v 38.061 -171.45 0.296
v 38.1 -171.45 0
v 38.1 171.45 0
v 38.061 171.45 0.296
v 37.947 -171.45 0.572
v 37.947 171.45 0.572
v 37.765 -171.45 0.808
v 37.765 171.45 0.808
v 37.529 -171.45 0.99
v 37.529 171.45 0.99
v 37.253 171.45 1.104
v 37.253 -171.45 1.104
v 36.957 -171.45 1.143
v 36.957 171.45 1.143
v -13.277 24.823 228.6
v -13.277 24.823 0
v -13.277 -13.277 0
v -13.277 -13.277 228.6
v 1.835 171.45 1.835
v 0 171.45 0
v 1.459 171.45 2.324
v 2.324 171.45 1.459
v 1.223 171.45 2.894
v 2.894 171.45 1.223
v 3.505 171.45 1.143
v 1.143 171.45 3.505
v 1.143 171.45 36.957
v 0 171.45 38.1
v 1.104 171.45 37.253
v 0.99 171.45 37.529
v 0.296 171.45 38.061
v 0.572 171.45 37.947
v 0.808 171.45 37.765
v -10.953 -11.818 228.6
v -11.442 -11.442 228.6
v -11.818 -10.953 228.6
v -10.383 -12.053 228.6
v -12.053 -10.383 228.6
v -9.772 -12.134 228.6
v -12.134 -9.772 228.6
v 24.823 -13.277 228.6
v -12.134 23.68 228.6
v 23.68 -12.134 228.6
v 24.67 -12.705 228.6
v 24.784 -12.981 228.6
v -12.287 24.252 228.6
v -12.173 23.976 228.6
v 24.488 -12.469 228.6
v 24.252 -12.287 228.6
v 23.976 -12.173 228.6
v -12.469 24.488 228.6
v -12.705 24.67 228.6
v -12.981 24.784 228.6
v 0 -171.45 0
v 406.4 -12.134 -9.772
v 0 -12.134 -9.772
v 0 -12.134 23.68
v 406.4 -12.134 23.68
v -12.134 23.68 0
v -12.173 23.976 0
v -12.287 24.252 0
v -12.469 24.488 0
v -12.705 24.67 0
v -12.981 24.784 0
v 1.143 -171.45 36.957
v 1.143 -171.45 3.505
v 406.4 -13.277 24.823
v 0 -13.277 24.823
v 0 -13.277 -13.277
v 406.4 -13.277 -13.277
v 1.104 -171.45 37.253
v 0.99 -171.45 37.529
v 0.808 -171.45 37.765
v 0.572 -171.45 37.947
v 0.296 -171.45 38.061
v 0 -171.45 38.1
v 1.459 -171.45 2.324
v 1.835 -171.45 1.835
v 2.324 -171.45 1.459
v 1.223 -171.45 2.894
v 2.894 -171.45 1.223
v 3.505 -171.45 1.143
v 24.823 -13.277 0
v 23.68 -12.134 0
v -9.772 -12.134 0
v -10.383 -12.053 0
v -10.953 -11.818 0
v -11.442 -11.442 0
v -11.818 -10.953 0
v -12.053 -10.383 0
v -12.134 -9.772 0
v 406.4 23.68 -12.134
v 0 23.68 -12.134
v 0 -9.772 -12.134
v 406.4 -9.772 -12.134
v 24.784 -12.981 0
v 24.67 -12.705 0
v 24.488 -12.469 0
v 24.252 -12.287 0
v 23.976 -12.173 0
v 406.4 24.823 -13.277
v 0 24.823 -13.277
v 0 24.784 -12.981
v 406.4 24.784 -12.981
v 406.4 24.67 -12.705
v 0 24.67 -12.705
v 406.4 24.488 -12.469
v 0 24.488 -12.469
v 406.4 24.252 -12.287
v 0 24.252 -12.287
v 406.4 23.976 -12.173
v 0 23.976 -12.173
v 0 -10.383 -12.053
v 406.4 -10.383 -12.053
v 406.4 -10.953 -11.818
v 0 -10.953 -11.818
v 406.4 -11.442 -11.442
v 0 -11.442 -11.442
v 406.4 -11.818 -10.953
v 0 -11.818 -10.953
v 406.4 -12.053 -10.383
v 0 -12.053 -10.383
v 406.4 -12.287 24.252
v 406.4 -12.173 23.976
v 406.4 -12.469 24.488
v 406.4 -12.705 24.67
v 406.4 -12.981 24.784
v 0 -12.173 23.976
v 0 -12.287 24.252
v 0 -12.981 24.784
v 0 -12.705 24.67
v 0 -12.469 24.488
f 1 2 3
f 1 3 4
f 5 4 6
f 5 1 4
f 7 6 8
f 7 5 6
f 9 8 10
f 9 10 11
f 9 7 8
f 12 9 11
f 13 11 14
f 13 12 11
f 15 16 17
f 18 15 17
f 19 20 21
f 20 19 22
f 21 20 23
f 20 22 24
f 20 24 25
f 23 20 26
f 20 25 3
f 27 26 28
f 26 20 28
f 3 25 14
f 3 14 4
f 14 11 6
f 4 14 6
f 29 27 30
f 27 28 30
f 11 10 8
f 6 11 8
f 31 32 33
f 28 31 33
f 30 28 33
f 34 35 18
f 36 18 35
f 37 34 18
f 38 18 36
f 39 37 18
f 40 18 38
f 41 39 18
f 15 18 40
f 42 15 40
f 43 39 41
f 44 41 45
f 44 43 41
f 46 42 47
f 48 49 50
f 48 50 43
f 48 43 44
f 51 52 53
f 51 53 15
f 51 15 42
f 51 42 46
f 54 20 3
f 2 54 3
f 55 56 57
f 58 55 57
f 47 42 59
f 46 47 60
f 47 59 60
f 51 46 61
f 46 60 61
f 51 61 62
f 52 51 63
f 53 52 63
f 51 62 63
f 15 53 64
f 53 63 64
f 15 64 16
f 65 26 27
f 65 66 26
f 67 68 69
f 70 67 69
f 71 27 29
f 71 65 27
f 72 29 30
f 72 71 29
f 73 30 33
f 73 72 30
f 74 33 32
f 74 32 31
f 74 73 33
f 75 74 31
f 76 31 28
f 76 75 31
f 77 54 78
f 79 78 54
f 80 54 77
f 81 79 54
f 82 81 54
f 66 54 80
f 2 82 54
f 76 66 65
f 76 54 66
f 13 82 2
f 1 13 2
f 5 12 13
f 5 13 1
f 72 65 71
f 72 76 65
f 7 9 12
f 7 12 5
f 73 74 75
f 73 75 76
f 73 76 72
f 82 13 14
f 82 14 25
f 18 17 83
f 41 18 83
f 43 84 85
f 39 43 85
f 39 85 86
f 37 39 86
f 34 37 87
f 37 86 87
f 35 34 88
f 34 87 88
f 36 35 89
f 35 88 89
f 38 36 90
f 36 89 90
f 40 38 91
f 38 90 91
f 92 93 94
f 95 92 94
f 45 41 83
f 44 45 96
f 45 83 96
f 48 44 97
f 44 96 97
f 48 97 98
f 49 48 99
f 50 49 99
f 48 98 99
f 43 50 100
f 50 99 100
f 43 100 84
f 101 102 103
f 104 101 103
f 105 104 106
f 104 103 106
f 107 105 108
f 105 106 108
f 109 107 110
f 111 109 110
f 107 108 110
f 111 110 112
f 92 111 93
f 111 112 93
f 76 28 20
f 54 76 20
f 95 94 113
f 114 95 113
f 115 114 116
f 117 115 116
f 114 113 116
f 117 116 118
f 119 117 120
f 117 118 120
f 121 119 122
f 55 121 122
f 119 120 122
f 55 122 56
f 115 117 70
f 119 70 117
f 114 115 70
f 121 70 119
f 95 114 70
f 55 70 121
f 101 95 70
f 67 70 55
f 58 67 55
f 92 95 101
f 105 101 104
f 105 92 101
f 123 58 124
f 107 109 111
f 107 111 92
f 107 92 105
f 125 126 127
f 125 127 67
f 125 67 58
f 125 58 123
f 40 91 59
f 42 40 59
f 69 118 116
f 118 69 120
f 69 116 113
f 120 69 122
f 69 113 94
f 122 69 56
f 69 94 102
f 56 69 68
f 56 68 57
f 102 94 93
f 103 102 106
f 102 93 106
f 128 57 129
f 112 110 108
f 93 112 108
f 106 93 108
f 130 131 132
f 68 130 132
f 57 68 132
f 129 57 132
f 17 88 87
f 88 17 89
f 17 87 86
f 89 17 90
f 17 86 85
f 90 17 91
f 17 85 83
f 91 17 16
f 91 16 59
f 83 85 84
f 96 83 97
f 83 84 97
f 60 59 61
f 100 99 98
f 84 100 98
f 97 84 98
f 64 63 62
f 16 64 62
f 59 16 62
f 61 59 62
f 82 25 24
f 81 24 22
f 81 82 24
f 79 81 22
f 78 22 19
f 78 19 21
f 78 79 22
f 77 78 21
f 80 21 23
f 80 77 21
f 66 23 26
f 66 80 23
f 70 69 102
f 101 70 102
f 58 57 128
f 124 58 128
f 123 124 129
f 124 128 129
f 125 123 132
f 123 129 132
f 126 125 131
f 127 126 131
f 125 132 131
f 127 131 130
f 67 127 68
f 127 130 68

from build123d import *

# Parameters (mm, degrees)
F1_DEPTH = 171.45
F3_DEPTH = 228.6
F5_DEPTH = 406.4


with BuildPart() as f1:
    # F0 (on Front) → F1 (new body, symmetric)
    with BuildSketch(Plane.XZ):
        with BuildLine():
            ThreePointArc((1.143, 36.957), (0.8082230509, 37.7652230509), (0, 38.1))
            Line((0, 38.1), (0, 0))
            Line((0, 0), (38.1, 0))
            ThreePointArc((38.1, 0), (37.7652230509, 0.8082230509), (36.957, 1.143))
            Line((36.957, 1.143), (3.5052, 1.143))
            ThreePointArc((3.5052, 1.143), (1.8348723615, 1.8348723615), (1.143, 3.5052))
            Line((1.143, 3.5052), (1.143, 36.957))
        make_face()
    extrude(amount=F1_DEPTH, both=True)


with BuildPart() as f3:
    # F2 (on Top) → F3 (new body)
    with BuildSketch(Plane.XY):
        with BuildLine():
            ThreePointArc((-12.1339824644, 23.6800175356), (-12.4687594135, 24.4882405865), (-13.2769824644, 24.8230175356))
            Line((-13.2769824644, 24.8230175356), (-13.2769824644, -13.2769824644))
            Line((-13.2769824644, -13.2769824644), (24.8230175356, -13.2769824644))
            ThreePointArc((24.8230175356, -13.2769824644), (24.4882405865, -12.4687594135), (23.6800175356, -12.1339824644))
            Line((23.6800175356, -12.1339824644), (-9.7717824644, -12.1339824644))
            ThreePointArc((-9.7717824644, -12.1339824644), (-11.442110103, -11.442110103), (-12.1339824644, -9.7717824644))
            Line((-12.1339824644, -9.7717824644), (-12.1339824644, 23.6800175356))
        make_face()
    extrude(amount=F3_DEPTH)


with BuildPart() as f5:
    # F4 (on Right) → F5 (new body)
    with BuildSketch(Plane.YZ):
        with BuildLine():
            ThreePointArc((-12.1339824644, 23.6800175356), (-12.4687594135, 24.4882405865), (-13.2769824644, 24.8230175356))
            Line((-13.2769824644, 24.8230175356), (-13.2769824644, -13.2769824644))
            Line((-13.2769824644, -13.2769824644), (24.8230175356, -13.2769824644))
            ThreePointArc((24.8230175356, -13.2769824644), (24.4882405865, -12.4687594135), (23.6800175356, -12.1339824644))
            Line((23.6800175356, -12.1339824644), (-9.7717824644, -12.1339824644))
            ThreePointArc((-9.7717824644, -12.1339824644), (-11.442110103, -11.442110103), (-12.1339824644, -9.7717824644))
            Line((-12.1339824644, -9.7717824644), (-12.1339824644, 23.6800175356))
        make_face()
    extrude(amount=F5_DEPTH)


solid = Compound([f1.part, f3.part, f5.part])
